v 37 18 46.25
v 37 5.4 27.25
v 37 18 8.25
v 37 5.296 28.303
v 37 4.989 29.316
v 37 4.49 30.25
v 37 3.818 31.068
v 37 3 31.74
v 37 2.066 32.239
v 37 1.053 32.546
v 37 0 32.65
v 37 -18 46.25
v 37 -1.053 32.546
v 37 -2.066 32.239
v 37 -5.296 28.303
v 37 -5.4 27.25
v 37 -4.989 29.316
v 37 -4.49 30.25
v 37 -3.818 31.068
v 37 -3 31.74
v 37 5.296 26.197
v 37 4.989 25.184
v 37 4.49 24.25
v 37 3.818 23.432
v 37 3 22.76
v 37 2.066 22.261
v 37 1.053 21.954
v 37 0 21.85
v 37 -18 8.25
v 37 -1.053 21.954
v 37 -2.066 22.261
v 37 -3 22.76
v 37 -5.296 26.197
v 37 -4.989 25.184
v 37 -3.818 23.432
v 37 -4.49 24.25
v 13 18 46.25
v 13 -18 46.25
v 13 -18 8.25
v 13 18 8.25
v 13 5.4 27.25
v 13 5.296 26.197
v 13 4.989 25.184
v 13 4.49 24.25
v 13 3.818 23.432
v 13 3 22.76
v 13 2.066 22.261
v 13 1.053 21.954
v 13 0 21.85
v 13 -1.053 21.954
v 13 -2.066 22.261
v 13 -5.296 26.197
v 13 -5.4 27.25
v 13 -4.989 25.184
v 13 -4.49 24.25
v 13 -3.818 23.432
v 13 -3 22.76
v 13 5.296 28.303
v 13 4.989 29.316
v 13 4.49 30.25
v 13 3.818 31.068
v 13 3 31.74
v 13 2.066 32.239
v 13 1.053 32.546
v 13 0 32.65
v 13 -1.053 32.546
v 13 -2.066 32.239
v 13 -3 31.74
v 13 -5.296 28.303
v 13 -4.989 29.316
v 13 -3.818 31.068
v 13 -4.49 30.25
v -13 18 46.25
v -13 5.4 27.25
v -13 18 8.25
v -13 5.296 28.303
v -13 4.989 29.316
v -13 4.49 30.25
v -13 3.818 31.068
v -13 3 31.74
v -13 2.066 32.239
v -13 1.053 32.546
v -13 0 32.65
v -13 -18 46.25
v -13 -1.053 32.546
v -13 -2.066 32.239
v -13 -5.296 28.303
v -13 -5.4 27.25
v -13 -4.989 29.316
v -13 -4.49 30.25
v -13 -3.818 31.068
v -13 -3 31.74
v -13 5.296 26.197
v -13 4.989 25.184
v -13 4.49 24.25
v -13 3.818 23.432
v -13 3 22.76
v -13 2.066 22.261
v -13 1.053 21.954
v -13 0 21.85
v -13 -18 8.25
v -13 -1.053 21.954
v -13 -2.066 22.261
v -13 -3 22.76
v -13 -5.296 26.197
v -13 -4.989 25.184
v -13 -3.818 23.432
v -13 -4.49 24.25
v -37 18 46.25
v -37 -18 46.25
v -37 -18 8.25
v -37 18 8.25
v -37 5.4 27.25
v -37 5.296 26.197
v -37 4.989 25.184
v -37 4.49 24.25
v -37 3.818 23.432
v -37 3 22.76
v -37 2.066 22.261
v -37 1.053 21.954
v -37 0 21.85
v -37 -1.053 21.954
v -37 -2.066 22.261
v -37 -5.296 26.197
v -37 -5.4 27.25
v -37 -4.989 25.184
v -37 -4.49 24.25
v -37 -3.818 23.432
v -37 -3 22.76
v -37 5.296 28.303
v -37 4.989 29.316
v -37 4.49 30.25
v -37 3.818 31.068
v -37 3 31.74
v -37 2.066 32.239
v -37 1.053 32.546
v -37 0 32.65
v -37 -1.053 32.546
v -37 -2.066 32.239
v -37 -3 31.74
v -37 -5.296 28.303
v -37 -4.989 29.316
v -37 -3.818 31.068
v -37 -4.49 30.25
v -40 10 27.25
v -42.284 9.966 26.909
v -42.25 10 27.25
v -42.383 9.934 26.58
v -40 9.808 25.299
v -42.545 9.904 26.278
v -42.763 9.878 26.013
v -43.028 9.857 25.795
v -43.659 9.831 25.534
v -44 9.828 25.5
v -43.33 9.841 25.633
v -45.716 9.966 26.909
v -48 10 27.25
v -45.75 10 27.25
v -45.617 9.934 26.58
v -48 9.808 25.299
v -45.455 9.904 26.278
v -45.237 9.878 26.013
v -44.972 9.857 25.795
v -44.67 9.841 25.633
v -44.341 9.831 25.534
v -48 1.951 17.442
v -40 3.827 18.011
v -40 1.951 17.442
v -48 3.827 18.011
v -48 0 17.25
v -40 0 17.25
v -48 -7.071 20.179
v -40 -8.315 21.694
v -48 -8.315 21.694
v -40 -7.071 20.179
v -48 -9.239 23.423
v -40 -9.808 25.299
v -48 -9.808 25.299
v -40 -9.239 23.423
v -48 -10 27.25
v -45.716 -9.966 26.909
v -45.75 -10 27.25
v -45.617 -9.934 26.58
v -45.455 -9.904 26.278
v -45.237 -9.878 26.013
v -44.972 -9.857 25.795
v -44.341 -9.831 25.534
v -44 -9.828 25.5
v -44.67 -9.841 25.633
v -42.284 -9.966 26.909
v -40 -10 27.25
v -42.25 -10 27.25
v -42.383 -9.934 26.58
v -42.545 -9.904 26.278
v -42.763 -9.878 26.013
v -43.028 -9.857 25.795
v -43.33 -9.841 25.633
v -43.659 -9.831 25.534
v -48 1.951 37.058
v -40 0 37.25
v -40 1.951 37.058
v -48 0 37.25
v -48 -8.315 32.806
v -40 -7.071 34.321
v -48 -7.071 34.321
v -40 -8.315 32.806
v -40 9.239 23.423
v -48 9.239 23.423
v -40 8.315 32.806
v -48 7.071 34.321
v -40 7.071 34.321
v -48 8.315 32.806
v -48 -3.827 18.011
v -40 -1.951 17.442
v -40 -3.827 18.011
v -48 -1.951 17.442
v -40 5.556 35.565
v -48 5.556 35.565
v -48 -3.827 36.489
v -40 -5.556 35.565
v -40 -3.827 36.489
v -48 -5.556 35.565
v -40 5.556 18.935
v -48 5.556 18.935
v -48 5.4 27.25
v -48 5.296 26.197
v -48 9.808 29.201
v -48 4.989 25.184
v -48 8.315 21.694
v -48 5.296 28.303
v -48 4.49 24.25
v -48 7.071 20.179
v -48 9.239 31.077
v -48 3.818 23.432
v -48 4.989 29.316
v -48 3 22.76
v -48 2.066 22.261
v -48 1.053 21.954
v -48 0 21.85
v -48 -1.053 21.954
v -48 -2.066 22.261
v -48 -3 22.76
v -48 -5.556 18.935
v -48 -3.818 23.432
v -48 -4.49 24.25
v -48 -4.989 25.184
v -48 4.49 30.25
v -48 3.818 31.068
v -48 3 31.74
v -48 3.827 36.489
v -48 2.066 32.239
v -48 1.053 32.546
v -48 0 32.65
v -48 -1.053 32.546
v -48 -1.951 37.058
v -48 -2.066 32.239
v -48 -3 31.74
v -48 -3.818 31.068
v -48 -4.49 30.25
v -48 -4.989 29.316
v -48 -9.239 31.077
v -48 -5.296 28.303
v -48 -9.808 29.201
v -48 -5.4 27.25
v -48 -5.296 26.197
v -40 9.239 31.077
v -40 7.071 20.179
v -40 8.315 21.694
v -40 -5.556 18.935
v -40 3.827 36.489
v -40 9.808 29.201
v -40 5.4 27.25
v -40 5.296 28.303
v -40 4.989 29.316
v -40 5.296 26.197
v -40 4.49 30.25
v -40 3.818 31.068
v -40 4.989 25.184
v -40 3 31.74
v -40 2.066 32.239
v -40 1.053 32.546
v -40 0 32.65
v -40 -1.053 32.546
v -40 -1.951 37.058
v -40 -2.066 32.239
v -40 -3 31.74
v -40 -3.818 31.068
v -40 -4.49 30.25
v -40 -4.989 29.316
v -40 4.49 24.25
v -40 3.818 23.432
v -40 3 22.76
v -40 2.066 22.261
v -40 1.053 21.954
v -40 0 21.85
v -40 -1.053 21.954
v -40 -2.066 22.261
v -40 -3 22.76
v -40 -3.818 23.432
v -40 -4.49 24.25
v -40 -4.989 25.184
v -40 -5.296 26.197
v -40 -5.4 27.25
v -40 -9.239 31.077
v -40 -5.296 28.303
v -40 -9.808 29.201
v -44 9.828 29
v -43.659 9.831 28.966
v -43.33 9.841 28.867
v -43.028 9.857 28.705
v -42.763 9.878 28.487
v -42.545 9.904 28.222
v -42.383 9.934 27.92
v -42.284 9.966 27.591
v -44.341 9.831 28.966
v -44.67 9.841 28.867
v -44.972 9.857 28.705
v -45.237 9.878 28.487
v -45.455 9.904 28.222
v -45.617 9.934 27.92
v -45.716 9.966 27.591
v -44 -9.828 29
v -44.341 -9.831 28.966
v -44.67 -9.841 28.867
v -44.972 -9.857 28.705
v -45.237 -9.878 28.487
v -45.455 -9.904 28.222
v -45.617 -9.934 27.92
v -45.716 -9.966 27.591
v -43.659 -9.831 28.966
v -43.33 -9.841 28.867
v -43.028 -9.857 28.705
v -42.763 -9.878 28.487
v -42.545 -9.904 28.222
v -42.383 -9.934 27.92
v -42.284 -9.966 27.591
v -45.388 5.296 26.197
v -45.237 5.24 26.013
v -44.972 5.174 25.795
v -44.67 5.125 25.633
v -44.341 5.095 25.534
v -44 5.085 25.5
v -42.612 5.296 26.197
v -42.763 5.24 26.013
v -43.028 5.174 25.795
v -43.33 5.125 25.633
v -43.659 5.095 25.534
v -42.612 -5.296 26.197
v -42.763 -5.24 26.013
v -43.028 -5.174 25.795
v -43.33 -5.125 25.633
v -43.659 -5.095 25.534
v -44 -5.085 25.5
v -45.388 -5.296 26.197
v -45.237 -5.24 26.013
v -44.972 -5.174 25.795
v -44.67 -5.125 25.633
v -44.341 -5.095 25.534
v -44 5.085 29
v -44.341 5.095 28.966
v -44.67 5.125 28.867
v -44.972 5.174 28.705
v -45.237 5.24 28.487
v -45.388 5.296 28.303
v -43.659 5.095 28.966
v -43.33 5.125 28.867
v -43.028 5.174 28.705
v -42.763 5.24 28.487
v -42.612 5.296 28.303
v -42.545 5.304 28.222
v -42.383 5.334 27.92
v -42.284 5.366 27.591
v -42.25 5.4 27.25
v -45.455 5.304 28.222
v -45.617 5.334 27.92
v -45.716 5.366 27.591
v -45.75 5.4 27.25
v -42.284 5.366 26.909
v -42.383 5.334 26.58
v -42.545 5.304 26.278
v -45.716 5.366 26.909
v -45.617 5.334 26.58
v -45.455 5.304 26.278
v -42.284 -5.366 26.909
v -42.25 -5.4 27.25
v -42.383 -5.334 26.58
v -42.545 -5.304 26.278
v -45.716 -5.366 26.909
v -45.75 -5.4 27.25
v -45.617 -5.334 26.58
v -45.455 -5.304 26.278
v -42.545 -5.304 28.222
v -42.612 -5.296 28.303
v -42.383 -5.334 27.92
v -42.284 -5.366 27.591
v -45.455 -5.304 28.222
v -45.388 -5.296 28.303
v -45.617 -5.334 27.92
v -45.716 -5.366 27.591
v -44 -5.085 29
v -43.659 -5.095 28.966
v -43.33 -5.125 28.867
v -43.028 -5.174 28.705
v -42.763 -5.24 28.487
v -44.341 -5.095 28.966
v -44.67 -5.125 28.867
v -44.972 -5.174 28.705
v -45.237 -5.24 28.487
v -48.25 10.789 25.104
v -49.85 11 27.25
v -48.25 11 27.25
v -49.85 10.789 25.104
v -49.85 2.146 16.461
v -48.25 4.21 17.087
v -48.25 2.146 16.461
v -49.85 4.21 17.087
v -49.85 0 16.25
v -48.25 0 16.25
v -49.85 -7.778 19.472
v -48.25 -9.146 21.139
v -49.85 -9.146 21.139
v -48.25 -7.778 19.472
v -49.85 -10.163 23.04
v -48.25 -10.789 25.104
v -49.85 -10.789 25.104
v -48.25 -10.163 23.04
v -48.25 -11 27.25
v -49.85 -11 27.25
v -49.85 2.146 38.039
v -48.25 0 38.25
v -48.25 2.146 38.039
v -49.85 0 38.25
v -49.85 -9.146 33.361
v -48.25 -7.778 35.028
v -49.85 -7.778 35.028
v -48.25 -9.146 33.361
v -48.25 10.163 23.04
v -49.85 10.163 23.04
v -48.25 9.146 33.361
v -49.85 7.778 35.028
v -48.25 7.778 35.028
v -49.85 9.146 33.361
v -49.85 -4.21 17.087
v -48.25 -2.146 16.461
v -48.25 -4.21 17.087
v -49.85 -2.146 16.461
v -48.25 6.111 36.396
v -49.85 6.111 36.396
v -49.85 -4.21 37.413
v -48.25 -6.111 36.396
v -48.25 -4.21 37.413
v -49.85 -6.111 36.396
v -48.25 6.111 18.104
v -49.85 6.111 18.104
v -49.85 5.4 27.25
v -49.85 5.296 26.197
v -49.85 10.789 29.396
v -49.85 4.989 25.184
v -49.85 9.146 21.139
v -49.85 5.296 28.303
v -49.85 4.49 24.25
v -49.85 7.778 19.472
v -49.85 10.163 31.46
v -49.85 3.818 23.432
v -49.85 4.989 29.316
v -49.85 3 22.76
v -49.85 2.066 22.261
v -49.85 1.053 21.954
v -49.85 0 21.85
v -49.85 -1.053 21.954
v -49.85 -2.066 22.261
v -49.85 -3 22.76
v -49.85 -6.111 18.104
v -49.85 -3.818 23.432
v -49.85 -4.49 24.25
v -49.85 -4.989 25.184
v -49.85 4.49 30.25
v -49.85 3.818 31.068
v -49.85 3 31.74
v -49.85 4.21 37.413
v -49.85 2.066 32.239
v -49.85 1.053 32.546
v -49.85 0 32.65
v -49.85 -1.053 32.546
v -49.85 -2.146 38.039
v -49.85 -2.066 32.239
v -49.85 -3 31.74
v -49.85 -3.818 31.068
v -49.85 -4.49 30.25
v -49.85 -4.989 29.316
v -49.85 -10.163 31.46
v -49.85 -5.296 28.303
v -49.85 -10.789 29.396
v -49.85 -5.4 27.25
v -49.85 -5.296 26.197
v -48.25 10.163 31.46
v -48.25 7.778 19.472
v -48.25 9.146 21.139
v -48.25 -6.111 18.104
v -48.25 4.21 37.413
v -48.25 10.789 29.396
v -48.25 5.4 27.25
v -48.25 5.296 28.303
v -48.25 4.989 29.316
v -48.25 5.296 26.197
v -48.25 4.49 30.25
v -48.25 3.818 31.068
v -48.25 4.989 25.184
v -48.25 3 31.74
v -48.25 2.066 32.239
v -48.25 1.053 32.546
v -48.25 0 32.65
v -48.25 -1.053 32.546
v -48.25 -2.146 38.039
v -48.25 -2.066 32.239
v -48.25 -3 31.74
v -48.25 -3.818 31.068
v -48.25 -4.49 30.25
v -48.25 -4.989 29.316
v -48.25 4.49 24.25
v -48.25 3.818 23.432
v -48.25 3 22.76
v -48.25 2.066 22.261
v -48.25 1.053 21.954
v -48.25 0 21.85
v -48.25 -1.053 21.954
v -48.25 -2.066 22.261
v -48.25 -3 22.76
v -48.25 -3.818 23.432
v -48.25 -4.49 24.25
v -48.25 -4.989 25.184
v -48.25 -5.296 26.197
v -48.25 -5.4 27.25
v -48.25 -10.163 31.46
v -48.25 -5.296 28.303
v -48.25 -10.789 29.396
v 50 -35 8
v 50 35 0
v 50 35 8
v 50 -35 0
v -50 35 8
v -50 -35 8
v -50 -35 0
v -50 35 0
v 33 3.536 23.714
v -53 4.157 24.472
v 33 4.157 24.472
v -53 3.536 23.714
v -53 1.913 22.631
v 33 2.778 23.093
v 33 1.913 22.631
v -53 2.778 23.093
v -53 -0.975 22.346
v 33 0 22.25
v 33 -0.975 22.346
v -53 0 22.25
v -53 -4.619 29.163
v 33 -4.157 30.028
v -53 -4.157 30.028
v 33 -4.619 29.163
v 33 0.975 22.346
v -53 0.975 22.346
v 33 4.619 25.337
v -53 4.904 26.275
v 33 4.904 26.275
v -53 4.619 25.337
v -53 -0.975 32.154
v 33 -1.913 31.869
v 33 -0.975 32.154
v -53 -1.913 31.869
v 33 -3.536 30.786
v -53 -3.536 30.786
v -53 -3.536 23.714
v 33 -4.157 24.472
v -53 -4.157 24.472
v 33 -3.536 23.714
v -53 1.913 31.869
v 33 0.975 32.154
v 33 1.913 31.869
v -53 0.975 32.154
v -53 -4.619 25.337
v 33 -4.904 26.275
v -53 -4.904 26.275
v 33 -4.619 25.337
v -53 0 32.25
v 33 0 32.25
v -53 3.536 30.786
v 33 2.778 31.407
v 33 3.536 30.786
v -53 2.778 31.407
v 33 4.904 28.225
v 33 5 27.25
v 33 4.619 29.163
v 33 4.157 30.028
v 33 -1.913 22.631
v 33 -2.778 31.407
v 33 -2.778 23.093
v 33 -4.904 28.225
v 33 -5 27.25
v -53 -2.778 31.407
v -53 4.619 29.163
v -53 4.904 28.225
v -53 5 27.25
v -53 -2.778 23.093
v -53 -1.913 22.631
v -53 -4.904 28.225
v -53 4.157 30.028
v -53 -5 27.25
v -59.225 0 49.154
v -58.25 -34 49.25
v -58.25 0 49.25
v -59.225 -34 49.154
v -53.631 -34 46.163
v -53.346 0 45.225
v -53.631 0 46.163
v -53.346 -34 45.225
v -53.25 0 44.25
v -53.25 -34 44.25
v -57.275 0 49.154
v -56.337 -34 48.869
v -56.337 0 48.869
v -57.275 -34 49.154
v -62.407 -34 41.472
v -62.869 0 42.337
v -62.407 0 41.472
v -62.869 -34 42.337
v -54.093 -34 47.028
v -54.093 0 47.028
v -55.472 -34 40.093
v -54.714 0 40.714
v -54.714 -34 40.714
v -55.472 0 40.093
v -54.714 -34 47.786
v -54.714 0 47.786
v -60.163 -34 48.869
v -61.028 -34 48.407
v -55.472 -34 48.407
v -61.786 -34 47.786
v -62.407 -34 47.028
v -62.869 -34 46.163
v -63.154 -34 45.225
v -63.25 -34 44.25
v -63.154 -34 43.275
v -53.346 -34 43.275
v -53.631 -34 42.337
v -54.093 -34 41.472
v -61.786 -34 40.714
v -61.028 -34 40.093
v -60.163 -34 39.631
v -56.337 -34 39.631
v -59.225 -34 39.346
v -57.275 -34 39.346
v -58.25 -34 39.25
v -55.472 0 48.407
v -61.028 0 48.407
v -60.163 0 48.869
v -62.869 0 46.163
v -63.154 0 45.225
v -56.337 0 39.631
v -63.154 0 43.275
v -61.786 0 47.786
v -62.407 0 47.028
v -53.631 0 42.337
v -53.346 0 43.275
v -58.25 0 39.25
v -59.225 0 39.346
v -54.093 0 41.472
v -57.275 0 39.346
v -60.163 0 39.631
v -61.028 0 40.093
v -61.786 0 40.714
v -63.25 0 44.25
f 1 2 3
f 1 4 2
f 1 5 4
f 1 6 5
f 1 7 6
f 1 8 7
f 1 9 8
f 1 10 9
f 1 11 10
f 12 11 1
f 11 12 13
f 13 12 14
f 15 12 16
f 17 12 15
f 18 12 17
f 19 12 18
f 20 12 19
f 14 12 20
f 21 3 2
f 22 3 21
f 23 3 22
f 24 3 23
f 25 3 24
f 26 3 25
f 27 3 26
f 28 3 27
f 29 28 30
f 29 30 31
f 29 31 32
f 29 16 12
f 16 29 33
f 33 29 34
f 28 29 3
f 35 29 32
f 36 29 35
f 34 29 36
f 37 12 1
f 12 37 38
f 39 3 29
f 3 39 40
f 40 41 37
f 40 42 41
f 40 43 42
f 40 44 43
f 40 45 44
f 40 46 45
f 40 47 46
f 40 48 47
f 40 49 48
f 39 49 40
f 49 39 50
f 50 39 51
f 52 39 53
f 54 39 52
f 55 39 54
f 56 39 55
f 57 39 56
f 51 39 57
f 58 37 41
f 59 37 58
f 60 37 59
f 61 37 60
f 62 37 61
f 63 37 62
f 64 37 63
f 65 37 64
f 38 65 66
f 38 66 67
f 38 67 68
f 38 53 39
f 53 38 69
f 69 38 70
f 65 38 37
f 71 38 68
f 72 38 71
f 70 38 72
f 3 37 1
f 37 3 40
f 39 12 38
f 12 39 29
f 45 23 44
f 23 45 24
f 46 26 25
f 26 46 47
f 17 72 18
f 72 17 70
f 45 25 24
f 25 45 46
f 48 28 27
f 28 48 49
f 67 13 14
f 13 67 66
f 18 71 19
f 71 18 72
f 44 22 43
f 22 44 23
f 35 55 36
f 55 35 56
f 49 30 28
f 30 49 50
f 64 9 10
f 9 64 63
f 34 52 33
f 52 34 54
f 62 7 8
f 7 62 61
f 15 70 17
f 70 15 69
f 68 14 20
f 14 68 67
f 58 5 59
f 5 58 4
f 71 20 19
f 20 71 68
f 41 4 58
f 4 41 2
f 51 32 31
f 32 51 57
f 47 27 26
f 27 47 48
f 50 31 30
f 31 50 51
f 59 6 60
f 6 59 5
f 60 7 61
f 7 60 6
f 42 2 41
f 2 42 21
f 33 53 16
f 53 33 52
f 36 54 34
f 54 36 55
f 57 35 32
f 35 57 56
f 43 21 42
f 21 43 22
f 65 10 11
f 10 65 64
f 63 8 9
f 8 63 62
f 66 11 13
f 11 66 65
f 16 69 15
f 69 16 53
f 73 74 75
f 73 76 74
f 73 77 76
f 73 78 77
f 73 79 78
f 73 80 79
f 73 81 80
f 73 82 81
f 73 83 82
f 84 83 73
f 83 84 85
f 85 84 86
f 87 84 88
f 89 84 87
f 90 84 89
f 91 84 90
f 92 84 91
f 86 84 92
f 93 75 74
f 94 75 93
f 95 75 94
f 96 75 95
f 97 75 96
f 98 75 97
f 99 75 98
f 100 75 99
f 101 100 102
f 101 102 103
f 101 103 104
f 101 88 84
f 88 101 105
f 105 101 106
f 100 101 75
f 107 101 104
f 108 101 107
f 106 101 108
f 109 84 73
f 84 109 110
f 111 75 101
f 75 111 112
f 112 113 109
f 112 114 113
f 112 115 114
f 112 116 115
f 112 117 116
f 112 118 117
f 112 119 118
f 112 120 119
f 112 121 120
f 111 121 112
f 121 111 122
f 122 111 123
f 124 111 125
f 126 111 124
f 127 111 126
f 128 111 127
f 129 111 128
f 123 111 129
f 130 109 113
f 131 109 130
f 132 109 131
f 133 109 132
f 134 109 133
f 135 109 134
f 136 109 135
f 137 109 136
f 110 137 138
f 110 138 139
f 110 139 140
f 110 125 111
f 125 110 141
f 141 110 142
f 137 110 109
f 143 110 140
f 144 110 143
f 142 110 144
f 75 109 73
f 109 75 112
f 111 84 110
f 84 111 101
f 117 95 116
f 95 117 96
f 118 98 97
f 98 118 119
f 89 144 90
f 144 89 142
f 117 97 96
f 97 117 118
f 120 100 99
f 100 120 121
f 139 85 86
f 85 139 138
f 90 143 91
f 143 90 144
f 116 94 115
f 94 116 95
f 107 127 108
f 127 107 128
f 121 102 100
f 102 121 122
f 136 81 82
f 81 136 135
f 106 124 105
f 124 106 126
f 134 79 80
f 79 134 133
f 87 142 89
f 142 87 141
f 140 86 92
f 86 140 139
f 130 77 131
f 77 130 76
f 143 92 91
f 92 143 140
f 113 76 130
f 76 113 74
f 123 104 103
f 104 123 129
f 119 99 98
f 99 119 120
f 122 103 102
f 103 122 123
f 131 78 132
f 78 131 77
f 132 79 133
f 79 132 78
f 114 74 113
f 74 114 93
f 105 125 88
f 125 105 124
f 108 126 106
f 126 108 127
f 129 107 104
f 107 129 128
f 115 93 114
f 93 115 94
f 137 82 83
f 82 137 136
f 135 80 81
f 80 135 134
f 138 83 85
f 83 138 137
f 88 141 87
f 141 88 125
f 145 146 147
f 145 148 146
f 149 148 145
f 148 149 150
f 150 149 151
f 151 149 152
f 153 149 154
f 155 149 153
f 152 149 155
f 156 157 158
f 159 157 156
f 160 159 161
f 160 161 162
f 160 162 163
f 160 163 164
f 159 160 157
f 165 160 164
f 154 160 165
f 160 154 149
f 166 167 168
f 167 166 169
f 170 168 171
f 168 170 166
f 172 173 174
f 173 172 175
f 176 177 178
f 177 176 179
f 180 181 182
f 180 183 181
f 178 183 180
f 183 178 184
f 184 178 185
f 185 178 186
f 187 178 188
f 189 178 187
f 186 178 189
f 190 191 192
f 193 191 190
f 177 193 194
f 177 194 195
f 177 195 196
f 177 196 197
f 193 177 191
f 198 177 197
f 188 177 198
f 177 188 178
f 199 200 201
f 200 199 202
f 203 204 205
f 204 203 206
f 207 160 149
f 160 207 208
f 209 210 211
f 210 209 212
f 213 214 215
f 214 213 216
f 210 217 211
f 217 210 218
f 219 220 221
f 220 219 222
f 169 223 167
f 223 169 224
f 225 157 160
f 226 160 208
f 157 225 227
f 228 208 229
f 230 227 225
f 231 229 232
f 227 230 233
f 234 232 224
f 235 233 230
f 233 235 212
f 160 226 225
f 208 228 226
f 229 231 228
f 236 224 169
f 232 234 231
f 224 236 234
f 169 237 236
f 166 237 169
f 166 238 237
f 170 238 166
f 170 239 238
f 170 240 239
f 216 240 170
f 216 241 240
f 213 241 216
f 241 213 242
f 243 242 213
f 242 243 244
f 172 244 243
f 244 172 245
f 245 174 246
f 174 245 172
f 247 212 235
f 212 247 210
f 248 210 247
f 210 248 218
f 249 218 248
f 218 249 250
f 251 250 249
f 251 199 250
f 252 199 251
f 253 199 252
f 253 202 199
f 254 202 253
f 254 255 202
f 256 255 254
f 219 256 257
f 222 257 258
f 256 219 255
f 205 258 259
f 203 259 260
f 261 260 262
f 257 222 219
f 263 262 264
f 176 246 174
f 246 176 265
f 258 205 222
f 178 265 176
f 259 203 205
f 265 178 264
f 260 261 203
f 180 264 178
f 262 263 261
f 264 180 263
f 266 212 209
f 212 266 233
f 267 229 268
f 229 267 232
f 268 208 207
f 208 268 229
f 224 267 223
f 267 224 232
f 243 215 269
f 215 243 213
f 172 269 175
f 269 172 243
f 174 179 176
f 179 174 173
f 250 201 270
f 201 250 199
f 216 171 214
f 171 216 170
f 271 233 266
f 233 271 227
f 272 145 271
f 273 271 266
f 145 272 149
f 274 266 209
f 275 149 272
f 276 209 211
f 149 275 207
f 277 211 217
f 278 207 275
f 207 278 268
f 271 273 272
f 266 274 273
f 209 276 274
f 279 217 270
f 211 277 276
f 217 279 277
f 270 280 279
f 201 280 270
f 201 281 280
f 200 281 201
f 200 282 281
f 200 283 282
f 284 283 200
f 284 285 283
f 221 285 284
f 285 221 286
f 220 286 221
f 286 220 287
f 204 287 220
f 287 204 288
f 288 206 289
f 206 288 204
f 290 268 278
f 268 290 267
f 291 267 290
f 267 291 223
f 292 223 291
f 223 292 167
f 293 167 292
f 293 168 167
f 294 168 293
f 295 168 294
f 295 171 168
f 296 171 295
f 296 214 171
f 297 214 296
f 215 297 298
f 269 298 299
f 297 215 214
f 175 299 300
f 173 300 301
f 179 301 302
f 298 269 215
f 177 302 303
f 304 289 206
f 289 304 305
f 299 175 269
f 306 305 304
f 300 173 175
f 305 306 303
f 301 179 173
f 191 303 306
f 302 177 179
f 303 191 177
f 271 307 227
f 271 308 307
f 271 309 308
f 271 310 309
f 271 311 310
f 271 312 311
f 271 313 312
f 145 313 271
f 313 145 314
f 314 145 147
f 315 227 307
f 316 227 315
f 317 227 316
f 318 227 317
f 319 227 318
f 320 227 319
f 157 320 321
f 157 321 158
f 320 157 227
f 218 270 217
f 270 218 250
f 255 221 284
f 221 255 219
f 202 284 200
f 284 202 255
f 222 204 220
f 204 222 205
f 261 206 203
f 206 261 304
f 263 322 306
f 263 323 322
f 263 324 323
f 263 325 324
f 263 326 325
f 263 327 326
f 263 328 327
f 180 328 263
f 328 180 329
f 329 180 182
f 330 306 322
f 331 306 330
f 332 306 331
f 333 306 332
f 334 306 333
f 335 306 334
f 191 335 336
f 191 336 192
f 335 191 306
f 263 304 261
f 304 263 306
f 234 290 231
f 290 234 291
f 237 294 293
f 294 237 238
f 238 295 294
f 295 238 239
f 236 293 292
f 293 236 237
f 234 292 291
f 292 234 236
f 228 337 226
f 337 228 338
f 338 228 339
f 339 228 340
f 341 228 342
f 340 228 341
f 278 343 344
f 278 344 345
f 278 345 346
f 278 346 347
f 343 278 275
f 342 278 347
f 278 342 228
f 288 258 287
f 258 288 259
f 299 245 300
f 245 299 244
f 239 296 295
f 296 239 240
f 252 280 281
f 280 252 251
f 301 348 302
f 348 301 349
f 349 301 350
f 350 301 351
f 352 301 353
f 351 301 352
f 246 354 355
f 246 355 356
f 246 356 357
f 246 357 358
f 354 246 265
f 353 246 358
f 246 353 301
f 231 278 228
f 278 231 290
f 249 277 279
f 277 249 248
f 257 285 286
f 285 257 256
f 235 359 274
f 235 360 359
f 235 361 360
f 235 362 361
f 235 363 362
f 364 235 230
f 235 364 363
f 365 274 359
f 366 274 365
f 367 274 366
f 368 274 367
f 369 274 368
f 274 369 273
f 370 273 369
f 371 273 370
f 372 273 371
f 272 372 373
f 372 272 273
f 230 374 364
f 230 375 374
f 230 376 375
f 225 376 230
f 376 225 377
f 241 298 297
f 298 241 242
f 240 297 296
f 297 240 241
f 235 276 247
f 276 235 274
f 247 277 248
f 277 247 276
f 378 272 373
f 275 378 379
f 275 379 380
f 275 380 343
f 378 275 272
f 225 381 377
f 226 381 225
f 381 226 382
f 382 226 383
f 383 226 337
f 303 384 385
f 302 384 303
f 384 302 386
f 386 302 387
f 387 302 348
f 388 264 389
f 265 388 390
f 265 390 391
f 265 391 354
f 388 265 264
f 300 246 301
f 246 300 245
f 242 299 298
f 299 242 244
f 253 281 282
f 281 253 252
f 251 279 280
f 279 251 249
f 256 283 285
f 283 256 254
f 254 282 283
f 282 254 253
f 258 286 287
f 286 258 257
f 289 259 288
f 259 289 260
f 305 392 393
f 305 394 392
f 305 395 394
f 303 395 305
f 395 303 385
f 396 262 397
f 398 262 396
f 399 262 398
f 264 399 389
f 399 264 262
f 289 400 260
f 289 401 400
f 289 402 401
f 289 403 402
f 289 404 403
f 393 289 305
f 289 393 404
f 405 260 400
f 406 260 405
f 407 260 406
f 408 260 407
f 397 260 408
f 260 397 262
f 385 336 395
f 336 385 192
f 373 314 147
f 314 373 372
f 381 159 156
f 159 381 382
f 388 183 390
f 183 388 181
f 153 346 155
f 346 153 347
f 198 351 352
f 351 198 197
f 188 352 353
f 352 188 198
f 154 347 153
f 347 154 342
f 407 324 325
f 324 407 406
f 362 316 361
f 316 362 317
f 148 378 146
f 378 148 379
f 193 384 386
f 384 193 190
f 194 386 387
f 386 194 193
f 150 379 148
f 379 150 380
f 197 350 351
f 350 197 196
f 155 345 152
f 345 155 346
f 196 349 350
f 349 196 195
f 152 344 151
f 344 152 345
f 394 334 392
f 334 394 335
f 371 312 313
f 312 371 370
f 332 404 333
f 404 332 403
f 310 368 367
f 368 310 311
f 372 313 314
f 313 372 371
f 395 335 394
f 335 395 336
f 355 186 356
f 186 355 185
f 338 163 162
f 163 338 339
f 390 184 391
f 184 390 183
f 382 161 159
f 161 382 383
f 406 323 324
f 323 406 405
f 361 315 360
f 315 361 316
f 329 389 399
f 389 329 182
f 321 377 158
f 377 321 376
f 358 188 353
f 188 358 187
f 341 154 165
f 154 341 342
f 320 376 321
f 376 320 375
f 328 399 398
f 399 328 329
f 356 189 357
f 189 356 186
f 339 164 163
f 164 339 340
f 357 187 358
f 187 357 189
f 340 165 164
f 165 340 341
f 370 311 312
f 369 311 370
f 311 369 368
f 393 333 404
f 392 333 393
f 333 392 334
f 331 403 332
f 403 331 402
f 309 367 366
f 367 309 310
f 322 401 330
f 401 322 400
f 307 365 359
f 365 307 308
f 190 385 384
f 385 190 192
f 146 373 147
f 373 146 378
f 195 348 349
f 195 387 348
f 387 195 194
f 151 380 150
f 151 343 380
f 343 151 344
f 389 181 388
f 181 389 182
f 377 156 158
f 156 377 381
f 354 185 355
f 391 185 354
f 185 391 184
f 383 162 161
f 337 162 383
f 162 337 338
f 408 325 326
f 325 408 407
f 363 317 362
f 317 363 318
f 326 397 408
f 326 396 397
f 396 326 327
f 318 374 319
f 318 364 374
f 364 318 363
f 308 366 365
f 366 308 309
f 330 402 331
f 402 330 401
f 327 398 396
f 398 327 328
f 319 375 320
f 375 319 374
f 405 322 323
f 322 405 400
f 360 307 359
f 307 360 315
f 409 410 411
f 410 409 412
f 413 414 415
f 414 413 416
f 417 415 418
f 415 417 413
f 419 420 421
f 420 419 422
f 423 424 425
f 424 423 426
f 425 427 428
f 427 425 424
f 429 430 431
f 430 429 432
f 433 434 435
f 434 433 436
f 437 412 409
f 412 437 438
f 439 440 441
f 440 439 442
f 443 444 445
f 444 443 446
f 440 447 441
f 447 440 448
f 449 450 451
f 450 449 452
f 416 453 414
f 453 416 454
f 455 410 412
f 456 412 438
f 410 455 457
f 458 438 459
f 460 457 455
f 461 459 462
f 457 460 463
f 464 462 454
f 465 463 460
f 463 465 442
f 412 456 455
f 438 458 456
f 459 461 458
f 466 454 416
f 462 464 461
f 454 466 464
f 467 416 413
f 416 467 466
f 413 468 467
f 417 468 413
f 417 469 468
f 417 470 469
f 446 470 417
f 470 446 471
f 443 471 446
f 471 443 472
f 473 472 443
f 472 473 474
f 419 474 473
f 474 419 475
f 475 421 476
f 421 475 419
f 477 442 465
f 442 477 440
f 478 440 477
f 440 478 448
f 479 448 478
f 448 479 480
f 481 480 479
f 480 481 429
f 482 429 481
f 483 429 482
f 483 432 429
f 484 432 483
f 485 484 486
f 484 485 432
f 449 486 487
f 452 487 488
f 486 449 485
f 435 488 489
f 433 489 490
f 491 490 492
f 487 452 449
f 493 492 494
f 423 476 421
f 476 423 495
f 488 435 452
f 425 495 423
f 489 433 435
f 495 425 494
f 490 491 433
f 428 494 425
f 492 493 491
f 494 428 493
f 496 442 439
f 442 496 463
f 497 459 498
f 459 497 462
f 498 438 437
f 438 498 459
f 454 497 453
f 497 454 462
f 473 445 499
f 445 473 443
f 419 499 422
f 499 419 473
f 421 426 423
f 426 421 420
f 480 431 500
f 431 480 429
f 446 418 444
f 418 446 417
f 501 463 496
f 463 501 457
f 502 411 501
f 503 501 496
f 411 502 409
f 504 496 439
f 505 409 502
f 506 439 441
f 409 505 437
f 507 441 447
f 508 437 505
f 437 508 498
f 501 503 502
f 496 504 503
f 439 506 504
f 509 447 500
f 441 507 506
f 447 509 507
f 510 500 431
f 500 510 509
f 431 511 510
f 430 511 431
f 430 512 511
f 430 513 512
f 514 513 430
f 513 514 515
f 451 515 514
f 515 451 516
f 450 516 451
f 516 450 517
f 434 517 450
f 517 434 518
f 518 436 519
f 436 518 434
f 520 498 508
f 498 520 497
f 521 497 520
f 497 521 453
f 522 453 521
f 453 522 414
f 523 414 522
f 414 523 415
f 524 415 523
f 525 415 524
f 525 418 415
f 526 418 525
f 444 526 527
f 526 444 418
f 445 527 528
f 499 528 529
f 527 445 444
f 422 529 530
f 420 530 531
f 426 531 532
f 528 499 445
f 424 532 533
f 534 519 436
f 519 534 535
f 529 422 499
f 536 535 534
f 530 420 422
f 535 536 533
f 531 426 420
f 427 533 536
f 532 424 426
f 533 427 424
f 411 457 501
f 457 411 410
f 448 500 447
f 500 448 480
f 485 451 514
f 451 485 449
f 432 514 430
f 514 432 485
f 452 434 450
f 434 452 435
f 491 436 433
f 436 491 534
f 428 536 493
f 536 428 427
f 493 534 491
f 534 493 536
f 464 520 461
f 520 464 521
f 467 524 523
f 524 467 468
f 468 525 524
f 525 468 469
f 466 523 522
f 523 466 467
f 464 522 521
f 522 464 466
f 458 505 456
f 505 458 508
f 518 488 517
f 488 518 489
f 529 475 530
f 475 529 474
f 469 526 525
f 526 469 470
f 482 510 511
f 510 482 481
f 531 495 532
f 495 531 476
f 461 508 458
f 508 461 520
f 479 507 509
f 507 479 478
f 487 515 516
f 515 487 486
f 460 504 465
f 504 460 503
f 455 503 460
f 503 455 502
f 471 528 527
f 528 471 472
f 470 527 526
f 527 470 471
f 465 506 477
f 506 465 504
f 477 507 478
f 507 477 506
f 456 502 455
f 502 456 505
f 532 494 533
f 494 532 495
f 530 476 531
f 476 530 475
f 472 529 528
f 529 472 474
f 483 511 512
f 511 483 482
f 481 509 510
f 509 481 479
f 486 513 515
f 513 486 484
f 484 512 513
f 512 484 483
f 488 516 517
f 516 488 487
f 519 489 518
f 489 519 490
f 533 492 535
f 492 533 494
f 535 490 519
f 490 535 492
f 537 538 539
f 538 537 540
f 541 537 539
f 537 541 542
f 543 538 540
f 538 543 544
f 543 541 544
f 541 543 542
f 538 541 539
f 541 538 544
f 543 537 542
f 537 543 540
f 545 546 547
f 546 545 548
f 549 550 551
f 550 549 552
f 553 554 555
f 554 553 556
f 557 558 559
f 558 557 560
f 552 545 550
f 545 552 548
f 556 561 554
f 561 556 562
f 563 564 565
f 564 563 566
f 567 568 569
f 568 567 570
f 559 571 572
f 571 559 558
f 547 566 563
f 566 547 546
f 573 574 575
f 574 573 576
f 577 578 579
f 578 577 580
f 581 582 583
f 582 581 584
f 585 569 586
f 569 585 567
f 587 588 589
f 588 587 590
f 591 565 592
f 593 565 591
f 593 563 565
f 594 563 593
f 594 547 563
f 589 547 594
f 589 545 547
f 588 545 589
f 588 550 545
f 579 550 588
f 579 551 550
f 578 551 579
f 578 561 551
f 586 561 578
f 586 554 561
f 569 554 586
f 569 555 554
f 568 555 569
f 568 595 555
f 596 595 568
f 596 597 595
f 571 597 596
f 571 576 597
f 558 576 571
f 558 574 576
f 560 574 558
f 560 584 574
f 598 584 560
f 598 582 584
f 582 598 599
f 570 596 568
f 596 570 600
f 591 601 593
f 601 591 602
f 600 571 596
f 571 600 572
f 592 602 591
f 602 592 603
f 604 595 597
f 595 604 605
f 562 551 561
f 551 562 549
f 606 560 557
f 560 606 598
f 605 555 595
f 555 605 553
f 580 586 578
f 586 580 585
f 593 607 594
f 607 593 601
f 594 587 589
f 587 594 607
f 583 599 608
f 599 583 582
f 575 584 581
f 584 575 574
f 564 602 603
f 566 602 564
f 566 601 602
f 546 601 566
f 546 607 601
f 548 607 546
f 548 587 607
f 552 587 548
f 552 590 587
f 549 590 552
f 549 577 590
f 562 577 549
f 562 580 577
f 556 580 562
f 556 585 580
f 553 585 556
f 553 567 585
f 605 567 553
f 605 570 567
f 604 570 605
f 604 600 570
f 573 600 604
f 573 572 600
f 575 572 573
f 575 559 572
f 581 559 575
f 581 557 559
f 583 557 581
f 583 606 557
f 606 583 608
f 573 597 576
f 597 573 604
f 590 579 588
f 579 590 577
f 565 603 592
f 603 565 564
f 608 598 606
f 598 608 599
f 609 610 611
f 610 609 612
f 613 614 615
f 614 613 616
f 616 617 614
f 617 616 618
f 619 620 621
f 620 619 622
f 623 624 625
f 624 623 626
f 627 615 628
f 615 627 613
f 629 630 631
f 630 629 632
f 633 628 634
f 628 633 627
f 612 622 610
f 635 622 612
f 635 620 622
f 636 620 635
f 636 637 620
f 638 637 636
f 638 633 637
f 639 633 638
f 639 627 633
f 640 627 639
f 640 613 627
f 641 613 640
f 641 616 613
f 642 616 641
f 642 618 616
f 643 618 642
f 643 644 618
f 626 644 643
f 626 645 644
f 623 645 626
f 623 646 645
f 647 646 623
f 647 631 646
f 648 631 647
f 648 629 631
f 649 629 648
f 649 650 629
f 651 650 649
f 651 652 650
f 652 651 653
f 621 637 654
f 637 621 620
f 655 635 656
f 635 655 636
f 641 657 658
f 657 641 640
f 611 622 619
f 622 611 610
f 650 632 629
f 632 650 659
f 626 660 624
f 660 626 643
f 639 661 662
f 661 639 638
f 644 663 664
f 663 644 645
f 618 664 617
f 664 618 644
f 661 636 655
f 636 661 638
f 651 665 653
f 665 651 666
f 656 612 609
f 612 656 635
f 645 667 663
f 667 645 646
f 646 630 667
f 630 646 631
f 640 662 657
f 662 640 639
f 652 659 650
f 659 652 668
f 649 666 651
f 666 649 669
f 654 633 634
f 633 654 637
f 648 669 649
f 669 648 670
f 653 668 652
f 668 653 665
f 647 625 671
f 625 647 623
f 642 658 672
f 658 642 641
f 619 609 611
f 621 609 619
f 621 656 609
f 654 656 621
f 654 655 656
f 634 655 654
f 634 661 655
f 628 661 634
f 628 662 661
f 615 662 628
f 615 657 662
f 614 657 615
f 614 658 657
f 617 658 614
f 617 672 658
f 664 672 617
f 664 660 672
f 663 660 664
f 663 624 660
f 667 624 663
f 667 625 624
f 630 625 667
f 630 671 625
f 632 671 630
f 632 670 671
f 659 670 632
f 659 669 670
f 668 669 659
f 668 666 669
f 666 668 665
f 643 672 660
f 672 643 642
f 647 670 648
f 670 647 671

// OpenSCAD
$fn = 32;

// ------------------------------------------------------------------------
// Machine vise: screw d10, jaws 24 x 38 mm
// Every part is its own module, assembly() places every instance.
// ------------------------------------------------------------------------

// --- part 1 ---
module vise_bed() {
  difference() {
    translate([-50, -35, 0]) cube([100, 70, 8]);
  }
}

// --- part 2 ---
module vise_jaw() {
  difference() {
    translate([-12, -18, 0]) cube([24, 36, 38]);
    translate([0, 0, 19]) rotate([0, 90, 0]) cylinder(h = 26, d = 10.8, center = true);
  }
}

// --- part 3 ---
module vise_screw() {
  translate([0, 0, -43]) cylinder(h = 86, d = 10);
}

// --- part 4 ---
module screw_collar() {
  difference() {
    cylinder(h = 8, d = 20);
    translate([0, 0, -1]) cylinder(h = 10, d = 10.8);
    translate([0, 0, 4]) rotate([90, 0, 0]) cylinder(h = 22, d = 3.5, center = true);
  }
}

// --- part 5 ---
module screw_washer() {
  difference() {
      translate([0, 0, 0]) cylinder(h = 1.6, d = 22);
      translate([0, 0, -1]) cylinder(h = 3.6, d = 10.8);
    }
}

// --- part 6 ---
module vise_handle() {
  cylinder(h = 34, d = 10);
}

// --- assembly ---
module assembly() {
  color([0.80, 0.24, 0.20]) translate([0, 0, 0]) rotate([0, 0, 0]) vise_bed();
  color([0.20, 0.45, 0.75]) translate([25, 0, 8.25]) rotate([0, 0, 0]) vise_jaw();
  color([0.25, 0.62, 0.32]) translate([-25, 0, 8.25]) rotate([0, 0, 0]) vise_jaw();
  color([0.92, 0.70, 0.18]) translate([-10, 0, 27.25]) rotate([0, 90, 0]) vise_screw();
  color([0.58, 0.35, 0.70]) translate([-48, 0, 27.25]) rotate([0, 90, 0]) screw_collar();
  color([0.16, 0.66, 0.66]) translate([-49.85, 0, 27.25]) rotate([0, 90, 0]) screw_washer();
  color([0.85, 0.48, 0.18]) translate([-58.25, 0, 44.25]) rotate([90, 0, 0]) vise_handle();
}

assembly();
